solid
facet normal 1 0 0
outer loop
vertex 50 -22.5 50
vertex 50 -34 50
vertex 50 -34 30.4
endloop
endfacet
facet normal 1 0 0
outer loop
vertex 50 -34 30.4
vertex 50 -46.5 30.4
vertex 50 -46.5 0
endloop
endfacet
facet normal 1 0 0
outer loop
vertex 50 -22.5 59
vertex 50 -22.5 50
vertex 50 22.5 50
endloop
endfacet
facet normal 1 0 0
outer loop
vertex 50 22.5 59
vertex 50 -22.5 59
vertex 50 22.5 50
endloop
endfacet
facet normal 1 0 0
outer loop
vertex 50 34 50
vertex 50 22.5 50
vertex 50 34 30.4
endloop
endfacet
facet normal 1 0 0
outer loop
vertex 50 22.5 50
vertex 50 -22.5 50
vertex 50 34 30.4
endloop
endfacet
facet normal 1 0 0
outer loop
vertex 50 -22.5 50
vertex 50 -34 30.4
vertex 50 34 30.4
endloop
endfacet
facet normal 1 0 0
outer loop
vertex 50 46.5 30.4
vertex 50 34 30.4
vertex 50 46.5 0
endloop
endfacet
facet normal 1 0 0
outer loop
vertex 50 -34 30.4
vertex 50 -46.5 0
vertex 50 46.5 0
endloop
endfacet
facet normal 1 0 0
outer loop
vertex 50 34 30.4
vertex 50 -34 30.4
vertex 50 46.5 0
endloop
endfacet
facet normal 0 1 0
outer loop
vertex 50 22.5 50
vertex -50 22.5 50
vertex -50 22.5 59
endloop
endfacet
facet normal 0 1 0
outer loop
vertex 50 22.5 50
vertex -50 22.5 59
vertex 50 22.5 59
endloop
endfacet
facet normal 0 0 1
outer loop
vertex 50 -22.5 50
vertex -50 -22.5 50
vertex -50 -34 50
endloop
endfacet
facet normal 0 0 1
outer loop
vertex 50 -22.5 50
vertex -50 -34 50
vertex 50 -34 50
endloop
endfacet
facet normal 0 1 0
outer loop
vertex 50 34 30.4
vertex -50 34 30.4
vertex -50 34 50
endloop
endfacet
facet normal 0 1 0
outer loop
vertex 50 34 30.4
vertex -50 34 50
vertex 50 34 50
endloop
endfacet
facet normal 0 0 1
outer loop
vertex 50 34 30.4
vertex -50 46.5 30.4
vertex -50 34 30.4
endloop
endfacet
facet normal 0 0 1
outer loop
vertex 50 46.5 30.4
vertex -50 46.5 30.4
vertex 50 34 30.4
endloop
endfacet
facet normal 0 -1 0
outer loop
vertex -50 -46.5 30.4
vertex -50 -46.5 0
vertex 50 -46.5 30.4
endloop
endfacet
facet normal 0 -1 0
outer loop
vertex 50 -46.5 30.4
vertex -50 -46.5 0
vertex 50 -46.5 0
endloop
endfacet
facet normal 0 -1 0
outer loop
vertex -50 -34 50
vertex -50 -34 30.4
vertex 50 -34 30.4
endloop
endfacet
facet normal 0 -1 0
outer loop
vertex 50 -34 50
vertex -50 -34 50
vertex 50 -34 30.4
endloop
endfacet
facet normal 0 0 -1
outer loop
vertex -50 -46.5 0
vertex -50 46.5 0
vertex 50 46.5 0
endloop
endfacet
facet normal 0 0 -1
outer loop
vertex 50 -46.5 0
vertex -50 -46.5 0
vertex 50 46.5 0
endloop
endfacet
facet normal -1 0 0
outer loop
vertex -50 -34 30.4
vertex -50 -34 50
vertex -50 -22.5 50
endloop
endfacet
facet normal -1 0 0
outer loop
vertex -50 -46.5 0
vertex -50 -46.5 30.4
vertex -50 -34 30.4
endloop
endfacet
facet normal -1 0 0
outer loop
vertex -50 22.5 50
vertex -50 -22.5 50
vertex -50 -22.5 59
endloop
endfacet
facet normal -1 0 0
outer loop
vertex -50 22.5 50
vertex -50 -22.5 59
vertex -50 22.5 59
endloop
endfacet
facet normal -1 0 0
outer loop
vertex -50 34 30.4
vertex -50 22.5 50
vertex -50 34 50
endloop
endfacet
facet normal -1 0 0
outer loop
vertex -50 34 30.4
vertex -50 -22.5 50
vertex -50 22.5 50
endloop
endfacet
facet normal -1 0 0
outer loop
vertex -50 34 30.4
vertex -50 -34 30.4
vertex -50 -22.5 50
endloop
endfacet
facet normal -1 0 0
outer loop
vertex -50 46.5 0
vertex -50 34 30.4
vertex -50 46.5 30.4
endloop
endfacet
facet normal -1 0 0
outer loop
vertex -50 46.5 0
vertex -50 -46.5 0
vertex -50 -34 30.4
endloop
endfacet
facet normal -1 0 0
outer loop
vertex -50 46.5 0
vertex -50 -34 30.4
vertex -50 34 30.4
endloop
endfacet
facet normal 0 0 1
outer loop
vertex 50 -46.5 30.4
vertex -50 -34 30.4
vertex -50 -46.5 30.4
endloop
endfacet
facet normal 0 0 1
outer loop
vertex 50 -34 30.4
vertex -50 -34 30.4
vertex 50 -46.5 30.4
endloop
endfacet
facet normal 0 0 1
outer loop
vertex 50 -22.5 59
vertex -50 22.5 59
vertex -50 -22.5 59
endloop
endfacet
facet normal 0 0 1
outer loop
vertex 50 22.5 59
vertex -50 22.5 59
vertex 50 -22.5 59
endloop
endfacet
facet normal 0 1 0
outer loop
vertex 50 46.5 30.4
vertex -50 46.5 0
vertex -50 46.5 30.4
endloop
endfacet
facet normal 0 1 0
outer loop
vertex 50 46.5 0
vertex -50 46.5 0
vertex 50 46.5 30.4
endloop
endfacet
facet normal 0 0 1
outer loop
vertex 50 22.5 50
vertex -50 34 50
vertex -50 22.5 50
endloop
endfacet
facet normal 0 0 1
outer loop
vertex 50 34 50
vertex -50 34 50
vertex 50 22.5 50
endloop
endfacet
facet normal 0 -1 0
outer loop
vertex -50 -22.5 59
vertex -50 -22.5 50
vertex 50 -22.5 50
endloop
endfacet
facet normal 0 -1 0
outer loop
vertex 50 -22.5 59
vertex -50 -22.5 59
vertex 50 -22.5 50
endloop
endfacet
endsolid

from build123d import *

# Parameters (mm, degrees)
F0_W     = 100
F0_H     = 45
F1_DEPTH = 59
F0_H_2   = 11.5
F2_DEPTH = 50
F0_H_3   = 12.5
F3_DEPTH = 30.4


with BuildPart() as f1:
    # F0 (on Top) → F1 (new body)
    with BuildSketch(Plane.XY):
        Rectangle(F0_W, F0_H)
    extrude(amount=F1_DEPTH)

    # F0 (on Top) → F2 (join)
    with BuildSketch(Plane.XY):
        with Locations((0, 28.25)):
            Rectangle(F0_W, F0_H_2)
        with Locations((0, -28.25)):
            Rectangle(F0_W, F0_H_2)
    extrude(amount=F2_DEPTH)

    # F0 (on Top) → F3 (join)
    with BuildSketch(Plane.XY):
        with Locations((0, 40.25)):
            Rectangle(F0_W, F0_H_3)
        with Locations((0, -40.25)):
            Rectangle(F0_W, F0_H_3)
    extrude(amount=F3_DEPTH)


solid = f1.part
